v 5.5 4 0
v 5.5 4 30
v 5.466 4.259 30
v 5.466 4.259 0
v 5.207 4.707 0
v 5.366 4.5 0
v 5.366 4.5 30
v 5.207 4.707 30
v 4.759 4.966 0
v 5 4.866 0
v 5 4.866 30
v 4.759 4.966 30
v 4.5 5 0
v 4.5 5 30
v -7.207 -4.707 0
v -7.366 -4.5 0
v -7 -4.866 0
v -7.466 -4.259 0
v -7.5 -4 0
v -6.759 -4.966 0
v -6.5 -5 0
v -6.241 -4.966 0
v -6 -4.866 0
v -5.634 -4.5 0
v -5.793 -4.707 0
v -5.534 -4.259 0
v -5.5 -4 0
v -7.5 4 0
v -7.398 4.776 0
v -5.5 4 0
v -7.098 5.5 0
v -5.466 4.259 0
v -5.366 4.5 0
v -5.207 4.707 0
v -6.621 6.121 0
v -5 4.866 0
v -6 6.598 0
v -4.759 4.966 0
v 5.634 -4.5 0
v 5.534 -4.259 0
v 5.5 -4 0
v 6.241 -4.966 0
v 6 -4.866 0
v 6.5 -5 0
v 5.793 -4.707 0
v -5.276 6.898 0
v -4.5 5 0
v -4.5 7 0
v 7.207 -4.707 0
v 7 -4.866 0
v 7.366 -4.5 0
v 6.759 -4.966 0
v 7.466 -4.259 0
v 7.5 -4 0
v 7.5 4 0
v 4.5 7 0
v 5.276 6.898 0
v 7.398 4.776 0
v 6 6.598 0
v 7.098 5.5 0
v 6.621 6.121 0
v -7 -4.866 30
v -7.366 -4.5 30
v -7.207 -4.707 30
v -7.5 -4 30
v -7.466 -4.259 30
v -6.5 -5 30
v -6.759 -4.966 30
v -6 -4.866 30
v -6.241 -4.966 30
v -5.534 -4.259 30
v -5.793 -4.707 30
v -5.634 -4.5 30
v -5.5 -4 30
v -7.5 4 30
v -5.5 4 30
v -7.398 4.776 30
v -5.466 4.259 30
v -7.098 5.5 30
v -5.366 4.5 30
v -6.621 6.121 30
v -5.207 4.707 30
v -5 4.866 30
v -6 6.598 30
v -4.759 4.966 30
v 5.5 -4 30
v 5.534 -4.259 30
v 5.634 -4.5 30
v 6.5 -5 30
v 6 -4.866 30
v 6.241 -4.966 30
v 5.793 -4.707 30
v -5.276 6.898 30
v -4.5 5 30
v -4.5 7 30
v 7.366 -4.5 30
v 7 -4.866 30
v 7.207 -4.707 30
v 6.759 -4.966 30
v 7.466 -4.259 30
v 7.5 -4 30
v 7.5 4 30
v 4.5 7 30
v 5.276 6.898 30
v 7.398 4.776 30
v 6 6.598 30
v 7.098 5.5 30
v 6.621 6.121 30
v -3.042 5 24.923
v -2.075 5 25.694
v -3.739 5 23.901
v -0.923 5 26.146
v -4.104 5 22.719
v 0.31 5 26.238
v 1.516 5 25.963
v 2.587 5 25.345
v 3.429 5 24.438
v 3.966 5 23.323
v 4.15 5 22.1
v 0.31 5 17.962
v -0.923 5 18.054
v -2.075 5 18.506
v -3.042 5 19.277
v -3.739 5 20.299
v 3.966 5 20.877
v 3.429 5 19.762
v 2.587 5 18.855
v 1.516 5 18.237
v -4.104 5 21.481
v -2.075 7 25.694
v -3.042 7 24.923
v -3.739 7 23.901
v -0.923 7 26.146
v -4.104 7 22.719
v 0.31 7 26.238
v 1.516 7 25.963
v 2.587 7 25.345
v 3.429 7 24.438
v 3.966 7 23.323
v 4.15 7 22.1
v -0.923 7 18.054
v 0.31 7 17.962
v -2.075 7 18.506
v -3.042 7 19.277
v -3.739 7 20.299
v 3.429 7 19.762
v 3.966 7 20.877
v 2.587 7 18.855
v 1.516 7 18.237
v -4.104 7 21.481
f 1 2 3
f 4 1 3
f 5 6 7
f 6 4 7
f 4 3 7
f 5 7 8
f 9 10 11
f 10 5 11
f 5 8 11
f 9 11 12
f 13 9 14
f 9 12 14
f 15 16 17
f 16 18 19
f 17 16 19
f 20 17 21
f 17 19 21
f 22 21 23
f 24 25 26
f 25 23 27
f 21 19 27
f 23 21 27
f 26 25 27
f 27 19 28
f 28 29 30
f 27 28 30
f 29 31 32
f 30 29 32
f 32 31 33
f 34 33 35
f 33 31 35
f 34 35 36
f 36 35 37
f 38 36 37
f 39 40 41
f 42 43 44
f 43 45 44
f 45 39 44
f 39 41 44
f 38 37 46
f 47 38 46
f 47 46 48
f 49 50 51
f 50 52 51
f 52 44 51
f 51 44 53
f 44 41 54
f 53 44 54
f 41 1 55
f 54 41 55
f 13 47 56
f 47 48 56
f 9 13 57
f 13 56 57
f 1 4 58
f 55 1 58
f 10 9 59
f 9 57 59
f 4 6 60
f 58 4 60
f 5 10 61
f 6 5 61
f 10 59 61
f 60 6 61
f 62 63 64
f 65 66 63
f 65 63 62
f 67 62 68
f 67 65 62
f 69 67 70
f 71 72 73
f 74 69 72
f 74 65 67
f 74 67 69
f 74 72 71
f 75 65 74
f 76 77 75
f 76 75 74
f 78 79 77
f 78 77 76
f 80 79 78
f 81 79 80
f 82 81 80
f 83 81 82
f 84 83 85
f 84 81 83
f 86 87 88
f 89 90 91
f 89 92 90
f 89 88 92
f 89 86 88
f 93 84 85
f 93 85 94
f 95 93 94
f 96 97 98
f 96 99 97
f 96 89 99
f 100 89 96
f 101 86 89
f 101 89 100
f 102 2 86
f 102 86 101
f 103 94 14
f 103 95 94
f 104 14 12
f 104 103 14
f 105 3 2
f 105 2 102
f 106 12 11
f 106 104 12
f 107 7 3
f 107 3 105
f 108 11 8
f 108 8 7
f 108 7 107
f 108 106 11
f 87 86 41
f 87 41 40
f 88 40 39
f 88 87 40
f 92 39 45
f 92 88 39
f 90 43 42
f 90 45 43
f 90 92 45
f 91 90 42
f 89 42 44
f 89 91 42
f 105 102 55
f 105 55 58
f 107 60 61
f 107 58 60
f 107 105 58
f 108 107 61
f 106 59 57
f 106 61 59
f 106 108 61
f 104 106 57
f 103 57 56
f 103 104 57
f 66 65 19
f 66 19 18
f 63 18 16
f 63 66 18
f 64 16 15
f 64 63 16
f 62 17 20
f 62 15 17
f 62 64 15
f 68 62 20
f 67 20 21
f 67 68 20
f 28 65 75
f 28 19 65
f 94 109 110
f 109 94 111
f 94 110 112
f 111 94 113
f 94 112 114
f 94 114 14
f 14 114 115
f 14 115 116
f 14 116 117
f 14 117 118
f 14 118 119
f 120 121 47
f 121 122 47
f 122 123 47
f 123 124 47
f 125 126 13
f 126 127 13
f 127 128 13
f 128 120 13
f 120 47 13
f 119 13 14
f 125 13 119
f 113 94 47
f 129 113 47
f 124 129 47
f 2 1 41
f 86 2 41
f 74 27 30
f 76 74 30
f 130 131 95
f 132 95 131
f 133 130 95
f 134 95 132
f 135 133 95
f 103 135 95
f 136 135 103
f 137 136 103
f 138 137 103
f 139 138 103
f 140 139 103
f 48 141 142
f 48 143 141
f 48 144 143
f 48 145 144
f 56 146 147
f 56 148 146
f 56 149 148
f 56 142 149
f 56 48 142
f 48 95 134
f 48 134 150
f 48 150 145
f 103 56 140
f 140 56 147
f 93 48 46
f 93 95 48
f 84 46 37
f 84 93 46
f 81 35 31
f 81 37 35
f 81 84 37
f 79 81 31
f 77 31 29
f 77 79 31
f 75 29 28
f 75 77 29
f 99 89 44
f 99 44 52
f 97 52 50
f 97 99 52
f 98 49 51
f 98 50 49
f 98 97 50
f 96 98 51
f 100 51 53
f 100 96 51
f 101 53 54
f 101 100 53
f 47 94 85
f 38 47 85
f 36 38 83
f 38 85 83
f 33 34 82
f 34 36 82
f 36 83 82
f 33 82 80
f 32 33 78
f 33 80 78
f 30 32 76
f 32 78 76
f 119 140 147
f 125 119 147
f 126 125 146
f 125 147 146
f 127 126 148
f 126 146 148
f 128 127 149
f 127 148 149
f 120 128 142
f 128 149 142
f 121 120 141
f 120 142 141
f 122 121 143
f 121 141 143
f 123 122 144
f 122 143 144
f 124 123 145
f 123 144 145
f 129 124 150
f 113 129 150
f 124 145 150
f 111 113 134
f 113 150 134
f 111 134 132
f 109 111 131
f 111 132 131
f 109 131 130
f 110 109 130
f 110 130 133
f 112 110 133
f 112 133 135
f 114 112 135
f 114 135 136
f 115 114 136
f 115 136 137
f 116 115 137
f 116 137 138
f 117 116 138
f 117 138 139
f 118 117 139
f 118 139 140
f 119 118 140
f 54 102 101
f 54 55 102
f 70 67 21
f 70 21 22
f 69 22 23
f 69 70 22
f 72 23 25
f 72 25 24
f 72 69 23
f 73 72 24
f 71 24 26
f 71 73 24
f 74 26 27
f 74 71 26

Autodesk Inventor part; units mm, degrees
ref_plane "YZ Plane" through (0, 0, 0) normal (1, 0, 0) x (0, 1, 0)
ref_plane "XZ Plane" through (0, 0, 0) normal (0, 1, 0) x (-1, 0, 0)
ref_plane "XY Plane" through (0, 0, 0) normal (0, 0, 1) x (1, 0, 0)
sketch "Sketch1" plane through (0, 0, 0) normal (0, 0, 1) x (1, 0, 0)
  line L0 (5.5, -5) -> (-5.5, -5) construction
  line L1 (-5.5, -5) -> (-5.5, 5)
  line L2 (-5.5, 5) -> (5.5, 5)
  line L3 (5.5, 5) -> (5.5, -5)
  line L4 (5.5, -5) -> (-5.5, 5) construction
  line L5 (-5.5, -5) -> (5.5, 5) construction
  line L6 (-7.5, 7) -> (7.5, 7)
  line L7 (7.5, 7) -> (7.5, -5)
  line L8 (7.5, -5) -> (-7.5, -5)
  line L9 (-7.5, -5) -> (-7.5, 7)
  line L10 (0, 0) -> (0, 7) construction
  point P0 (0, 0)
  dimension "d6" = 11
  dimension "d7" = 10
  dimension "d8" = 2
  dimension "d9" = 10
  dimension "d10" = 2
extrude "Extrusion1" add sketch "Sketch1" along normal blind 30 contours L8 L9 L6 L7 L3 L2 L1
sketch "Sketch2" plane through (-7.5, 7, 0) normal (0, 1, 0) x (1, 0, 0)
  line L0 (7.5, 0) -> (7.5, -30) construction
  line L1 (15, -30) -> (0, -30) construction
  circle A0 centre (7.5, -22.1) radius 4.15
  dimension "d14" = 7.9
  dimension "d15" = 8.3
extrude "Extrusion2" cut sketch "Sketch2" against normal up to next
sketch "Sketch3" plane through (0, 0, 0) normal (0, 0, 1) x (1, 0, 0)
  line L0 (-7.5, 7) -> (-7.5, -5) construction
  line L1 (7.5, -5) -> (7.5, 7) construction
  line L2 (5.5, -5) -> (7.5, -5) construction
  line L3 (7.5, 7) -> (-7.5, 7) construction
  line L4 (-7.5, -5) -> (-5.5, -5) construction
  line L5 (5.5, 5) -> (5.5, -5) construction
  line L6 (-5.5, -5) -> (5.5, -5) construction
  line L7 (0, -5) -> (0, 7)
  line L8 (-4.15, 7) -> (4.15, 7) construction
  line L9 (-7.5, 7) -> (-7.5, -5) construction
  line L10 (-7.5, 0) -> (7.5, 0)
  point P0 (0, 0)
fillet "Fillet1" radius 1 6 edges at (-5.5, -5, 15) (-7.5, -5, 15) (5.5, -5, 15) (7.5, -5, 15) (-5.5, 5, 15) (5.5, 5, 15)
fillet "Fillet4" radius 3 2 edges at (-7.5, 7, 15) (7.5, 7, 15)
properties part number "base_fotodiode"
